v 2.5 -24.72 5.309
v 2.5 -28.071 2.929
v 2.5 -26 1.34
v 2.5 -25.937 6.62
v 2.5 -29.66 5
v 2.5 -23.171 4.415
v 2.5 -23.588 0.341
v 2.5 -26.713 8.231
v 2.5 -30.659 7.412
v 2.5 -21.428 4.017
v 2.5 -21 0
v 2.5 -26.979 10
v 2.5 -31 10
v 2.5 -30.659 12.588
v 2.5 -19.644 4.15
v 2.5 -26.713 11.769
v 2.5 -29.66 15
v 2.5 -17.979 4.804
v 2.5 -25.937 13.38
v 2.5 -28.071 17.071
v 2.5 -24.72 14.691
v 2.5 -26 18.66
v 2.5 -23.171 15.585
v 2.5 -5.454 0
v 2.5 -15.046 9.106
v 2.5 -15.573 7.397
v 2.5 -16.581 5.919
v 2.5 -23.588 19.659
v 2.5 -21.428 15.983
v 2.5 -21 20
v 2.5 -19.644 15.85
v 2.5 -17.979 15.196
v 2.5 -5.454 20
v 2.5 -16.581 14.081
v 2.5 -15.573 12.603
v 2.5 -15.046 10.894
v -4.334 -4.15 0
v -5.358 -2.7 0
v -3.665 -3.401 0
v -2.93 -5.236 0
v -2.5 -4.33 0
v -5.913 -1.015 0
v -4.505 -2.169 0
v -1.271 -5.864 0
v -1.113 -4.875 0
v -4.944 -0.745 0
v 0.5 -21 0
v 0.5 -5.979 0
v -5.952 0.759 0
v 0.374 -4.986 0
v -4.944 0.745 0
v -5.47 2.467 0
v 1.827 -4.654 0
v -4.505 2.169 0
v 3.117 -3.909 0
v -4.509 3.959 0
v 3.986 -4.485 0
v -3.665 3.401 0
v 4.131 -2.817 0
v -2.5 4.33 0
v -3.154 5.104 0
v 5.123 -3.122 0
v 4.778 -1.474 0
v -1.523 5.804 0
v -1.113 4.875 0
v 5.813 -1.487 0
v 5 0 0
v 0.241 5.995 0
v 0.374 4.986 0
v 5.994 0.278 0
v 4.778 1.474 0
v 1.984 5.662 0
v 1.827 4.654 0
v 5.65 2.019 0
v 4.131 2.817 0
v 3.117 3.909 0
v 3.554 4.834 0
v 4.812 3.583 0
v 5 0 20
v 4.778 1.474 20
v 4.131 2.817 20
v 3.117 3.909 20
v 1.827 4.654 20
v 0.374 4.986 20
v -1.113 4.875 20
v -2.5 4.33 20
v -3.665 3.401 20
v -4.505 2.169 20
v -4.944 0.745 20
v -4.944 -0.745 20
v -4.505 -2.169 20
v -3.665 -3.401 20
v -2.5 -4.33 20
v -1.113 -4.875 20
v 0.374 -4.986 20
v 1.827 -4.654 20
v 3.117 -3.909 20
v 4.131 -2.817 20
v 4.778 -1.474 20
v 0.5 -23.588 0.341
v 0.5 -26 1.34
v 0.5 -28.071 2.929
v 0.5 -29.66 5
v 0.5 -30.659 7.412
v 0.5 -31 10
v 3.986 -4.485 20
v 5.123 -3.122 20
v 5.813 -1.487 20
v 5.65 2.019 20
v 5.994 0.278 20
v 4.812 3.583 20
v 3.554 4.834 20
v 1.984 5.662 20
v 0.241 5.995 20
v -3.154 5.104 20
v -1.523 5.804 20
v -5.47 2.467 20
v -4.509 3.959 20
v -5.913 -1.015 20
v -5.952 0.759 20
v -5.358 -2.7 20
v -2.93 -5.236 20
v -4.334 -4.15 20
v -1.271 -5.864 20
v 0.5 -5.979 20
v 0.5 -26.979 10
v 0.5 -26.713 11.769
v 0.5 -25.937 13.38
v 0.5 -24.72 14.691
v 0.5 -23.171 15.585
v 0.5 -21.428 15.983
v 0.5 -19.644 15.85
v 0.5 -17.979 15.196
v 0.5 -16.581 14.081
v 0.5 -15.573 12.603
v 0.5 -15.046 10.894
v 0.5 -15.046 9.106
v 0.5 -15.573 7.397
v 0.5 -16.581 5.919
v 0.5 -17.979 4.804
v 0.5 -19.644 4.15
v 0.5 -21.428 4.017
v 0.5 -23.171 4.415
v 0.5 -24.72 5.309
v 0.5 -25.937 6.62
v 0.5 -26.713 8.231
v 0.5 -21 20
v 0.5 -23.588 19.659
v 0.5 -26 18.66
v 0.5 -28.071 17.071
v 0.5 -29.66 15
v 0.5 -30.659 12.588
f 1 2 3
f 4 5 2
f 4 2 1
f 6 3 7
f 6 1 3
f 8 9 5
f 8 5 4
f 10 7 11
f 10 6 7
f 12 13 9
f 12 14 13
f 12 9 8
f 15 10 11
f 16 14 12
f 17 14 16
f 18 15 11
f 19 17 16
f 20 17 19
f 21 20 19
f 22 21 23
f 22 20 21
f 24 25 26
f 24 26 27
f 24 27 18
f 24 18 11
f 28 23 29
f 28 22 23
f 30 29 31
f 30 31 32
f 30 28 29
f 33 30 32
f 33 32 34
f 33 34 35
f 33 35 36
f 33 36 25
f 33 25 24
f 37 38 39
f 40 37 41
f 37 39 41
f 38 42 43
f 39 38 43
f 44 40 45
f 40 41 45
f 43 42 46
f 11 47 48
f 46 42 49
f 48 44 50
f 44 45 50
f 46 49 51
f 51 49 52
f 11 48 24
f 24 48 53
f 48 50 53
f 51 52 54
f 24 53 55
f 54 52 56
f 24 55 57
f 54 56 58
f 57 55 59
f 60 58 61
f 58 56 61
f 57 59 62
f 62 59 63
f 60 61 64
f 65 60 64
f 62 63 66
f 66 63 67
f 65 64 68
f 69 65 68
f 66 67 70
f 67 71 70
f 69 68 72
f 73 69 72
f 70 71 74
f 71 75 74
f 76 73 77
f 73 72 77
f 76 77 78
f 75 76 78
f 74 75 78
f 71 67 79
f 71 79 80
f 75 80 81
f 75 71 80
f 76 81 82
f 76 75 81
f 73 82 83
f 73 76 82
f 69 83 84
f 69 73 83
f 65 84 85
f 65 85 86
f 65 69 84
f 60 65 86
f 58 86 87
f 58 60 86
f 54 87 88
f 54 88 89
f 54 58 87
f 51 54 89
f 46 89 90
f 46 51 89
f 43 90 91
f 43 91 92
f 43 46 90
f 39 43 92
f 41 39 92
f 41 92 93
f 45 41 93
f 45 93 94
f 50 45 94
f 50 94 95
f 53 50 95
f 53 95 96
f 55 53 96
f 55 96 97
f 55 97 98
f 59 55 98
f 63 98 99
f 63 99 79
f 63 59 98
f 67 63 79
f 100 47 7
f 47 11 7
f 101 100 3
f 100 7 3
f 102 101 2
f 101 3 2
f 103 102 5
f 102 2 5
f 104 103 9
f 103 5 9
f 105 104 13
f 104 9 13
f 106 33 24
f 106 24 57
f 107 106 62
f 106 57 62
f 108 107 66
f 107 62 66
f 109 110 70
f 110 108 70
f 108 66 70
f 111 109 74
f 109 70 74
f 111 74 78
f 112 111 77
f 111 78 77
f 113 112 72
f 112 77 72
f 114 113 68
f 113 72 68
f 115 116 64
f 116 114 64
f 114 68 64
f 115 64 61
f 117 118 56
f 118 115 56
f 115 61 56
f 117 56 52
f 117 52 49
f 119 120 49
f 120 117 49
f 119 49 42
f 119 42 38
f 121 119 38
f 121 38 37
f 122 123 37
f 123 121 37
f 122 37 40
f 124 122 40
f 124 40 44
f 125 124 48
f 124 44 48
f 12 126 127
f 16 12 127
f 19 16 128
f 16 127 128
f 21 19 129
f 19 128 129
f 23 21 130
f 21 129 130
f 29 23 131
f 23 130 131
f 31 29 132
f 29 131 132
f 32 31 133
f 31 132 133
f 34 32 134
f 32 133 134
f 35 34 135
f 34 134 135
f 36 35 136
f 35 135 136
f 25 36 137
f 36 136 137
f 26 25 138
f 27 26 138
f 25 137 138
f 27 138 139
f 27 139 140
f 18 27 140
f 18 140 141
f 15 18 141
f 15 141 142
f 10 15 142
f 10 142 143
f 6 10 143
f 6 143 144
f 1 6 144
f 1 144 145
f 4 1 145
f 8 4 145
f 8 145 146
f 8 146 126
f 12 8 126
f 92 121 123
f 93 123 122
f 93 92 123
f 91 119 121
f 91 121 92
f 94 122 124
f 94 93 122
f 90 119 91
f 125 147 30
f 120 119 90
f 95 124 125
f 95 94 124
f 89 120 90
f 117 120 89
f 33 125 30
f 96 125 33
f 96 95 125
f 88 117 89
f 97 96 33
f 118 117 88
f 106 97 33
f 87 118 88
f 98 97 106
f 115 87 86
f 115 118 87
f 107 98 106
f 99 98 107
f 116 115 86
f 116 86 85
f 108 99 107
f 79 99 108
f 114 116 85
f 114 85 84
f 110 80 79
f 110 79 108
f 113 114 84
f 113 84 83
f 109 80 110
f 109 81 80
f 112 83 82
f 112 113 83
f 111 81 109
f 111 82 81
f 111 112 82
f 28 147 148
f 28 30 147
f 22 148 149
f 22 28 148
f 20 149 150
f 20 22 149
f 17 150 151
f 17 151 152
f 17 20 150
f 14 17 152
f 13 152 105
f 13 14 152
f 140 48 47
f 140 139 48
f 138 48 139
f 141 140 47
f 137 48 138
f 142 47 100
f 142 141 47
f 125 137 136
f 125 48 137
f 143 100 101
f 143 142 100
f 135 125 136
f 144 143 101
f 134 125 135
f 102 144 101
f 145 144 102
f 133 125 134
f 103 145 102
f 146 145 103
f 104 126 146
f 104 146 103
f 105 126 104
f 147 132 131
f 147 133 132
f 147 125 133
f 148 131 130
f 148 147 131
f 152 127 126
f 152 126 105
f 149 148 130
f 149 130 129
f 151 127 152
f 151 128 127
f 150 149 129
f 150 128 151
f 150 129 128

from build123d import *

# Parameters (mm, degrees)
F0_R     = 6
F0_R_2   = 5
F1_DEPTH = 20
F3_DEPTH = 20
F4_R     = 6
F5_DEPTH = 5.501
F6_R     = 9.99999


# Not quite as in the source:
# - a fillet or chamfer is up to 0.001 mm smaller than in the source, because OpenCascade refuses the exact size


with BuildPart() as f1:
    # F0 (on Top) → F1 (new body)
    with BuildSketch(Plane.XY):
        Circle(F0_R)
        Circle(F0_R_2, mode=Mode.SUBTRACT)
    extrude(amount=F1_DEPTH)

    # F2 (on face) → F3 (join)
    with BuildSketch(Plane.XY.offset(20)):
        with BuildLine():
            Line((0.5, -6), (0.5, -31))
            Line((0.5, -31), (2.5, -31))
            Line((2.5, -31), (2.5, -6))
            Line((2.5, -6), (2.5, -5.4543560573))
            ThreePointArc((2.5, -5.4543560573), (1.52277609, -5.8035465863), (0.5, -5.9791303716))
            Line((0.5, -5.9791303716), (0.5, -6))
        make_face()
    extrude(amount=-F3_DEPTH)

    # F4 (on face) → F5 (cut, through all)
    with BuildSketch(Plane(origin=(0.5, 0, 0), x_dir=(0, -1, 0), z_dir=(-1, 0, 0))):
        with Locations((20.9791303716, 10)):
            Circle(F4_R)
    extrude(amount=-F5_DEPTH, mode=Mode.SUBTRACT)

    # F6 (radius 10 in the source; OpenCascade refuses exactly that, so slightly less here)
    f6_edges = [f1.edges().sort_by_distance(p)[0] for p in [
        (1.5, -31, 20),
        (1.5, -31, 0),
    ]]
    fillet(f6_edges, radius=F6_R)


solid = f1.part
